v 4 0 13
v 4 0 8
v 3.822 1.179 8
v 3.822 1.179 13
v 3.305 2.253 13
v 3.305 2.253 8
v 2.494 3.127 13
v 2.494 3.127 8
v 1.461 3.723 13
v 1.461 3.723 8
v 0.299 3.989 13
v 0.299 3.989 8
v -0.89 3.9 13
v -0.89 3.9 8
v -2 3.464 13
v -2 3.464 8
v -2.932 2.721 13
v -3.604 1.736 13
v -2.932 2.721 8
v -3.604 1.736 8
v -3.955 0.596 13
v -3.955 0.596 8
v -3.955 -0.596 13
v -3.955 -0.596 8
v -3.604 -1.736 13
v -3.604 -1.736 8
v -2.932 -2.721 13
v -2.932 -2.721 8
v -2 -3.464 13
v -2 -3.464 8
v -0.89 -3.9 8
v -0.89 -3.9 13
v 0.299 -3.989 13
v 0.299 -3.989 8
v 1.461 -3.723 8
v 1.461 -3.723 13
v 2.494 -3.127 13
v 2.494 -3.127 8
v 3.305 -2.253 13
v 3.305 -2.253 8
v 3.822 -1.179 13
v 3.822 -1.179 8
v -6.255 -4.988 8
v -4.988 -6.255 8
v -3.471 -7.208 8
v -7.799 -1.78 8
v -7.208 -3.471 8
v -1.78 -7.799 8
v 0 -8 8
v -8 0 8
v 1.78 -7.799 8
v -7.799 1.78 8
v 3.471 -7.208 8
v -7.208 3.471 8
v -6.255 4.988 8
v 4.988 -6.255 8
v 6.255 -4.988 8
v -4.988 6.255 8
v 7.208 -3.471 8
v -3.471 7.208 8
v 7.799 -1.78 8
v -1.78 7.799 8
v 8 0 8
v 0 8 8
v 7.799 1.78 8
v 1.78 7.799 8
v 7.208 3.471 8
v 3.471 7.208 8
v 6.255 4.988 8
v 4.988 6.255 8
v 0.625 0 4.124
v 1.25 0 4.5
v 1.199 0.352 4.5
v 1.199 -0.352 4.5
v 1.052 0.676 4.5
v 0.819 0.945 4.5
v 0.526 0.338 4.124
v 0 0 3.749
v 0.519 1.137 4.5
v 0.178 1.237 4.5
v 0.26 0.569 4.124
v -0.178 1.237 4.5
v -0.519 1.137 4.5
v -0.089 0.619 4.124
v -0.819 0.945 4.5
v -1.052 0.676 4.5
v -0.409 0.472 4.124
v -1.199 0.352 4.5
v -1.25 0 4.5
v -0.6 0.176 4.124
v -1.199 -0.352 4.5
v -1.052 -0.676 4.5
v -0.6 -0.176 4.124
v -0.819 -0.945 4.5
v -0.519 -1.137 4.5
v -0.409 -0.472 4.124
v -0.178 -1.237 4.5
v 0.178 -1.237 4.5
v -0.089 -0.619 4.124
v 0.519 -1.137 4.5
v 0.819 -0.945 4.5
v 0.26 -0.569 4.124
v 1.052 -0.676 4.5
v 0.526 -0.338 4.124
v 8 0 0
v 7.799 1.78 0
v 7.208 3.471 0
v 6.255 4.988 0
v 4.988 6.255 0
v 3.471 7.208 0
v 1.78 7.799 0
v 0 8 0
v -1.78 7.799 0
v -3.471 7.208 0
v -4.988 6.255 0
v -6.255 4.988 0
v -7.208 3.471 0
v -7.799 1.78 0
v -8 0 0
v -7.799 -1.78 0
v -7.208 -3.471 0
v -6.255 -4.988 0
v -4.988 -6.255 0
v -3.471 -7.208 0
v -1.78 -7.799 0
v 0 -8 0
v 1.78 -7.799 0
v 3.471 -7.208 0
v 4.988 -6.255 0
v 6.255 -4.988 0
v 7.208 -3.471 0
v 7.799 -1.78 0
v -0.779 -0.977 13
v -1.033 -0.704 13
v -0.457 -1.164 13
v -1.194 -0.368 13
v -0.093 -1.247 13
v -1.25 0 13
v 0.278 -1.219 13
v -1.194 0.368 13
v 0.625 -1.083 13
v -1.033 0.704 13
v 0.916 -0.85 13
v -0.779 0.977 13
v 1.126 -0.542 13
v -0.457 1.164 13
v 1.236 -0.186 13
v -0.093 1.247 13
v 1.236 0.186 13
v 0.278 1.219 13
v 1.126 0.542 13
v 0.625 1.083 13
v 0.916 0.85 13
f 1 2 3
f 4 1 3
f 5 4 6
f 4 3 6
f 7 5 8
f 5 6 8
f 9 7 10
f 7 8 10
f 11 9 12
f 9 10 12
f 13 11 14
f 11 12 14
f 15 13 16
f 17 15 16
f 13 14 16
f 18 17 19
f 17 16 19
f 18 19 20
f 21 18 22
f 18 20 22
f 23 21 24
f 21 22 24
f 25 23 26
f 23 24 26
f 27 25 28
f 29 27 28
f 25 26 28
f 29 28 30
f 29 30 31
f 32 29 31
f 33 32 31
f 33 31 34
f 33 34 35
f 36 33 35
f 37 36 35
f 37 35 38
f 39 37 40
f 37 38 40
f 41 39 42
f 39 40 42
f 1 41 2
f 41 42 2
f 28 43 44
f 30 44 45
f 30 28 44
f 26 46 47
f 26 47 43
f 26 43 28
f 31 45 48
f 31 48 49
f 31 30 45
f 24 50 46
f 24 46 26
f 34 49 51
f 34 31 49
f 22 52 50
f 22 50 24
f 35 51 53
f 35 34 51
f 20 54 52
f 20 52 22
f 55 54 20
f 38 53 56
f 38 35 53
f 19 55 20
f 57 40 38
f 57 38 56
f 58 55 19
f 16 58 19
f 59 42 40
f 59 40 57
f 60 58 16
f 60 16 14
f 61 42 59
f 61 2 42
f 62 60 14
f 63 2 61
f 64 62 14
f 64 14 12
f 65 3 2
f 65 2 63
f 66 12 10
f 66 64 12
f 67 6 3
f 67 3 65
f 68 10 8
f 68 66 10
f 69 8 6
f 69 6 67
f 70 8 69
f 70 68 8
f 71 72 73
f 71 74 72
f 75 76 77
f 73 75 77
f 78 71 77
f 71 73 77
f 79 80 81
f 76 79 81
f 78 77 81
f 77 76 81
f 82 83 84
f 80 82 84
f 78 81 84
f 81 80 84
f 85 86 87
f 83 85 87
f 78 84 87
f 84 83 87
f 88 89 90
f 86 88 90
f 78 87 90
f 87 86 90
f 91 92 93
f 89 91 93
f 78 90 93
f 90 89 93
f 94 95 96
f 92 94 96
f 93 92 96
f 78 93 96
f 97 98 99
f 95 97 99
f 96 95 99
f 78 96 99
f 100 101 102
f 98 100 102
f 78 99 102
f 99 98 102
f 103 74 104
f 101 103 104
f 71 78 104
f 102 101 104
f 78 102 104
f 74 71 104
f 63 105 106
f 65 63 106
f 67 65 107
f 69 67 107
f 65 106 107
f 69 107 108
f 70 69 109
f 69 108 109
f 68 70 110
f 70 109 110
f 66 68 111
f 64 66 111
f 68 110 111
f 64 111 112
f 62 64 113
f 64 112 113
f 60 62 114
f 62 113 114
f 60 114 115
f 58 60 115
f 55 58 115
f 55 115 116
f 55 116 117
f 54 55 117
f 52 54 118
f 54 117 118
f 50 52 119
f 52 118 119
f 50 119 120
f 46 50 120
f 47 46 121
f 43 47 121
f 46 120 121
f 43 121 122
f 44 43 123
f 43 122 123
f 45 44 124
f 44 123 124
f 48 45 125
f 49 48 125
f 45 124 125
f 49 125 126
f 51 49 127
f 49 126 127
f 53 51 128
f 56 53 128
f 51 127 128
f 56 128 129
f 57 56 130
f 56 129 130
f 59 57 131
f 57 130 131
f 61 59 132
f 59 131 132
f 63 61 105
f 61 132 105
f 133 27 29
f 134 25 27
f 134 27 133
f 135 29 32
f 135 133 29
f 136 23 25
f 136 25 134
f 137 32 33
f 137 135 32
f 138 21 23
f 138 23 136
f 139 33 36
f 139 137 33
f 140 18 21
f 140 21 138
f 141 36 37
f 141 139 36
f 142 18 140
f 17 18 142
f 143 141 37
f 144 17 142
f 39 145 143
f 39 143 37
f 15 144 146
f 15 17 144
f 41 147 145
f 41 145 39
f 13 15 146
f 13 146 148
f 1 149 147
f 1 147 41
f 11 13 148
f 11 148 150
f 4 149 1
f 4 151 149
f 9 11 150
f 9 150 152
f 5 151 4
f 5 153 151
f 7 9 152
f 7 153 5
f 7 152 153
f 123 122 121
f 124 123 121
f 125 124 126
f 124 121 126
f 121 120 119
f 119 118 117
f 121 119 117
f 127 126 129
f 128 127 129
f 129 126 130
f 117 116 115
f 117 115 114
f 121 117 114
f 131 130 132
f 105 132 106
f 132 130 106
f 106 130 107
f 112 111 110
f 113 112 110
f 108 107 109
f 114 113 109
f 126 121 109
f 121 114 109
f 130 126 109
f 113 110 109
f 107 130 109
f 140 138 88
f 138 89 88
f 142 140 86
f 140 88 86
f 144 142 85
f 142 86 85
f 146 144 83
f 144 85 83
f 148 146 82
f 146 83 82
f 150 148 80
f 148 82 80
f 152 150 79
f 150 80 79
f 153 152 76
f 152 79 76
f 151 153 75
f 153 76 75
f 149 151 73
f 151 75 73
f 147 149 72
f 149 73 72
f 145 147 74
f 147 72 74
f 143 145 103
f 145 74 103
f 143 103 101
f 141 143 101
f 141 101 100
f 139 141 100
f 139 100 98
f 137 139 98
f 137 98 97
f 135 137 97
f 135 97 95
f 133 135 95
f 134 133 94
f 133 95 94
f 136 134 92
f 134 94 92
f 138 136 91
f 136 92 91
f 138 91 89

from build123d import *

# Parameters (mm, degrees)
SKETCH1_R             = 8
BOSS_EXTRUDE1_DEPTH   = 8
SKETCH2_R             = 4
BOSS_EXTRUDE2_DEPTH   = 5
M3_TAPPED_HOLE1_D     = 2.5
M3_TAPPED_HOLE1_DEPTH = 8.5
M3_TAPPED_HOLE1_TIP   = 0.751075774


with BuildPart() as part:
    # Sketch1 → Boss-Extrude1 (new body)
    with BuildSketch(Plane.XY):
        Circle(SKETCH1_R)
    extrude(amount=BOSS_EXTRUDE1_DEPTH)

    # Sketch2 → Boss-Extrude2 (add)
    with BuildSketch(Plane.XY.offset(8)):
        Circle(SKETCH2_R)
    extrude(amount=BOSS_EXTRUDE2_DEPTH)

    # M3 Tapped Hole1
    with Locations(Plane.XY.offset(13)):
        with Locations((0, 0)):
            Hole(M3_TAPPED_HOLE1_D / 2, depth=M3_TAPPED_HOLE1_DEPTH)
            with Locations((0, 0, -(M3_TAPPED_HOLE1_DEPTH + M3_TAPPED_HOLE1_TIP / 2))):  # 118° drill point
                Cone(0, M3_TAPPED_HOLE1_D / 2, M3_TAPPED_HOLE1_TIP, mode=Mode.SUBTRACT)


solid = part.part
